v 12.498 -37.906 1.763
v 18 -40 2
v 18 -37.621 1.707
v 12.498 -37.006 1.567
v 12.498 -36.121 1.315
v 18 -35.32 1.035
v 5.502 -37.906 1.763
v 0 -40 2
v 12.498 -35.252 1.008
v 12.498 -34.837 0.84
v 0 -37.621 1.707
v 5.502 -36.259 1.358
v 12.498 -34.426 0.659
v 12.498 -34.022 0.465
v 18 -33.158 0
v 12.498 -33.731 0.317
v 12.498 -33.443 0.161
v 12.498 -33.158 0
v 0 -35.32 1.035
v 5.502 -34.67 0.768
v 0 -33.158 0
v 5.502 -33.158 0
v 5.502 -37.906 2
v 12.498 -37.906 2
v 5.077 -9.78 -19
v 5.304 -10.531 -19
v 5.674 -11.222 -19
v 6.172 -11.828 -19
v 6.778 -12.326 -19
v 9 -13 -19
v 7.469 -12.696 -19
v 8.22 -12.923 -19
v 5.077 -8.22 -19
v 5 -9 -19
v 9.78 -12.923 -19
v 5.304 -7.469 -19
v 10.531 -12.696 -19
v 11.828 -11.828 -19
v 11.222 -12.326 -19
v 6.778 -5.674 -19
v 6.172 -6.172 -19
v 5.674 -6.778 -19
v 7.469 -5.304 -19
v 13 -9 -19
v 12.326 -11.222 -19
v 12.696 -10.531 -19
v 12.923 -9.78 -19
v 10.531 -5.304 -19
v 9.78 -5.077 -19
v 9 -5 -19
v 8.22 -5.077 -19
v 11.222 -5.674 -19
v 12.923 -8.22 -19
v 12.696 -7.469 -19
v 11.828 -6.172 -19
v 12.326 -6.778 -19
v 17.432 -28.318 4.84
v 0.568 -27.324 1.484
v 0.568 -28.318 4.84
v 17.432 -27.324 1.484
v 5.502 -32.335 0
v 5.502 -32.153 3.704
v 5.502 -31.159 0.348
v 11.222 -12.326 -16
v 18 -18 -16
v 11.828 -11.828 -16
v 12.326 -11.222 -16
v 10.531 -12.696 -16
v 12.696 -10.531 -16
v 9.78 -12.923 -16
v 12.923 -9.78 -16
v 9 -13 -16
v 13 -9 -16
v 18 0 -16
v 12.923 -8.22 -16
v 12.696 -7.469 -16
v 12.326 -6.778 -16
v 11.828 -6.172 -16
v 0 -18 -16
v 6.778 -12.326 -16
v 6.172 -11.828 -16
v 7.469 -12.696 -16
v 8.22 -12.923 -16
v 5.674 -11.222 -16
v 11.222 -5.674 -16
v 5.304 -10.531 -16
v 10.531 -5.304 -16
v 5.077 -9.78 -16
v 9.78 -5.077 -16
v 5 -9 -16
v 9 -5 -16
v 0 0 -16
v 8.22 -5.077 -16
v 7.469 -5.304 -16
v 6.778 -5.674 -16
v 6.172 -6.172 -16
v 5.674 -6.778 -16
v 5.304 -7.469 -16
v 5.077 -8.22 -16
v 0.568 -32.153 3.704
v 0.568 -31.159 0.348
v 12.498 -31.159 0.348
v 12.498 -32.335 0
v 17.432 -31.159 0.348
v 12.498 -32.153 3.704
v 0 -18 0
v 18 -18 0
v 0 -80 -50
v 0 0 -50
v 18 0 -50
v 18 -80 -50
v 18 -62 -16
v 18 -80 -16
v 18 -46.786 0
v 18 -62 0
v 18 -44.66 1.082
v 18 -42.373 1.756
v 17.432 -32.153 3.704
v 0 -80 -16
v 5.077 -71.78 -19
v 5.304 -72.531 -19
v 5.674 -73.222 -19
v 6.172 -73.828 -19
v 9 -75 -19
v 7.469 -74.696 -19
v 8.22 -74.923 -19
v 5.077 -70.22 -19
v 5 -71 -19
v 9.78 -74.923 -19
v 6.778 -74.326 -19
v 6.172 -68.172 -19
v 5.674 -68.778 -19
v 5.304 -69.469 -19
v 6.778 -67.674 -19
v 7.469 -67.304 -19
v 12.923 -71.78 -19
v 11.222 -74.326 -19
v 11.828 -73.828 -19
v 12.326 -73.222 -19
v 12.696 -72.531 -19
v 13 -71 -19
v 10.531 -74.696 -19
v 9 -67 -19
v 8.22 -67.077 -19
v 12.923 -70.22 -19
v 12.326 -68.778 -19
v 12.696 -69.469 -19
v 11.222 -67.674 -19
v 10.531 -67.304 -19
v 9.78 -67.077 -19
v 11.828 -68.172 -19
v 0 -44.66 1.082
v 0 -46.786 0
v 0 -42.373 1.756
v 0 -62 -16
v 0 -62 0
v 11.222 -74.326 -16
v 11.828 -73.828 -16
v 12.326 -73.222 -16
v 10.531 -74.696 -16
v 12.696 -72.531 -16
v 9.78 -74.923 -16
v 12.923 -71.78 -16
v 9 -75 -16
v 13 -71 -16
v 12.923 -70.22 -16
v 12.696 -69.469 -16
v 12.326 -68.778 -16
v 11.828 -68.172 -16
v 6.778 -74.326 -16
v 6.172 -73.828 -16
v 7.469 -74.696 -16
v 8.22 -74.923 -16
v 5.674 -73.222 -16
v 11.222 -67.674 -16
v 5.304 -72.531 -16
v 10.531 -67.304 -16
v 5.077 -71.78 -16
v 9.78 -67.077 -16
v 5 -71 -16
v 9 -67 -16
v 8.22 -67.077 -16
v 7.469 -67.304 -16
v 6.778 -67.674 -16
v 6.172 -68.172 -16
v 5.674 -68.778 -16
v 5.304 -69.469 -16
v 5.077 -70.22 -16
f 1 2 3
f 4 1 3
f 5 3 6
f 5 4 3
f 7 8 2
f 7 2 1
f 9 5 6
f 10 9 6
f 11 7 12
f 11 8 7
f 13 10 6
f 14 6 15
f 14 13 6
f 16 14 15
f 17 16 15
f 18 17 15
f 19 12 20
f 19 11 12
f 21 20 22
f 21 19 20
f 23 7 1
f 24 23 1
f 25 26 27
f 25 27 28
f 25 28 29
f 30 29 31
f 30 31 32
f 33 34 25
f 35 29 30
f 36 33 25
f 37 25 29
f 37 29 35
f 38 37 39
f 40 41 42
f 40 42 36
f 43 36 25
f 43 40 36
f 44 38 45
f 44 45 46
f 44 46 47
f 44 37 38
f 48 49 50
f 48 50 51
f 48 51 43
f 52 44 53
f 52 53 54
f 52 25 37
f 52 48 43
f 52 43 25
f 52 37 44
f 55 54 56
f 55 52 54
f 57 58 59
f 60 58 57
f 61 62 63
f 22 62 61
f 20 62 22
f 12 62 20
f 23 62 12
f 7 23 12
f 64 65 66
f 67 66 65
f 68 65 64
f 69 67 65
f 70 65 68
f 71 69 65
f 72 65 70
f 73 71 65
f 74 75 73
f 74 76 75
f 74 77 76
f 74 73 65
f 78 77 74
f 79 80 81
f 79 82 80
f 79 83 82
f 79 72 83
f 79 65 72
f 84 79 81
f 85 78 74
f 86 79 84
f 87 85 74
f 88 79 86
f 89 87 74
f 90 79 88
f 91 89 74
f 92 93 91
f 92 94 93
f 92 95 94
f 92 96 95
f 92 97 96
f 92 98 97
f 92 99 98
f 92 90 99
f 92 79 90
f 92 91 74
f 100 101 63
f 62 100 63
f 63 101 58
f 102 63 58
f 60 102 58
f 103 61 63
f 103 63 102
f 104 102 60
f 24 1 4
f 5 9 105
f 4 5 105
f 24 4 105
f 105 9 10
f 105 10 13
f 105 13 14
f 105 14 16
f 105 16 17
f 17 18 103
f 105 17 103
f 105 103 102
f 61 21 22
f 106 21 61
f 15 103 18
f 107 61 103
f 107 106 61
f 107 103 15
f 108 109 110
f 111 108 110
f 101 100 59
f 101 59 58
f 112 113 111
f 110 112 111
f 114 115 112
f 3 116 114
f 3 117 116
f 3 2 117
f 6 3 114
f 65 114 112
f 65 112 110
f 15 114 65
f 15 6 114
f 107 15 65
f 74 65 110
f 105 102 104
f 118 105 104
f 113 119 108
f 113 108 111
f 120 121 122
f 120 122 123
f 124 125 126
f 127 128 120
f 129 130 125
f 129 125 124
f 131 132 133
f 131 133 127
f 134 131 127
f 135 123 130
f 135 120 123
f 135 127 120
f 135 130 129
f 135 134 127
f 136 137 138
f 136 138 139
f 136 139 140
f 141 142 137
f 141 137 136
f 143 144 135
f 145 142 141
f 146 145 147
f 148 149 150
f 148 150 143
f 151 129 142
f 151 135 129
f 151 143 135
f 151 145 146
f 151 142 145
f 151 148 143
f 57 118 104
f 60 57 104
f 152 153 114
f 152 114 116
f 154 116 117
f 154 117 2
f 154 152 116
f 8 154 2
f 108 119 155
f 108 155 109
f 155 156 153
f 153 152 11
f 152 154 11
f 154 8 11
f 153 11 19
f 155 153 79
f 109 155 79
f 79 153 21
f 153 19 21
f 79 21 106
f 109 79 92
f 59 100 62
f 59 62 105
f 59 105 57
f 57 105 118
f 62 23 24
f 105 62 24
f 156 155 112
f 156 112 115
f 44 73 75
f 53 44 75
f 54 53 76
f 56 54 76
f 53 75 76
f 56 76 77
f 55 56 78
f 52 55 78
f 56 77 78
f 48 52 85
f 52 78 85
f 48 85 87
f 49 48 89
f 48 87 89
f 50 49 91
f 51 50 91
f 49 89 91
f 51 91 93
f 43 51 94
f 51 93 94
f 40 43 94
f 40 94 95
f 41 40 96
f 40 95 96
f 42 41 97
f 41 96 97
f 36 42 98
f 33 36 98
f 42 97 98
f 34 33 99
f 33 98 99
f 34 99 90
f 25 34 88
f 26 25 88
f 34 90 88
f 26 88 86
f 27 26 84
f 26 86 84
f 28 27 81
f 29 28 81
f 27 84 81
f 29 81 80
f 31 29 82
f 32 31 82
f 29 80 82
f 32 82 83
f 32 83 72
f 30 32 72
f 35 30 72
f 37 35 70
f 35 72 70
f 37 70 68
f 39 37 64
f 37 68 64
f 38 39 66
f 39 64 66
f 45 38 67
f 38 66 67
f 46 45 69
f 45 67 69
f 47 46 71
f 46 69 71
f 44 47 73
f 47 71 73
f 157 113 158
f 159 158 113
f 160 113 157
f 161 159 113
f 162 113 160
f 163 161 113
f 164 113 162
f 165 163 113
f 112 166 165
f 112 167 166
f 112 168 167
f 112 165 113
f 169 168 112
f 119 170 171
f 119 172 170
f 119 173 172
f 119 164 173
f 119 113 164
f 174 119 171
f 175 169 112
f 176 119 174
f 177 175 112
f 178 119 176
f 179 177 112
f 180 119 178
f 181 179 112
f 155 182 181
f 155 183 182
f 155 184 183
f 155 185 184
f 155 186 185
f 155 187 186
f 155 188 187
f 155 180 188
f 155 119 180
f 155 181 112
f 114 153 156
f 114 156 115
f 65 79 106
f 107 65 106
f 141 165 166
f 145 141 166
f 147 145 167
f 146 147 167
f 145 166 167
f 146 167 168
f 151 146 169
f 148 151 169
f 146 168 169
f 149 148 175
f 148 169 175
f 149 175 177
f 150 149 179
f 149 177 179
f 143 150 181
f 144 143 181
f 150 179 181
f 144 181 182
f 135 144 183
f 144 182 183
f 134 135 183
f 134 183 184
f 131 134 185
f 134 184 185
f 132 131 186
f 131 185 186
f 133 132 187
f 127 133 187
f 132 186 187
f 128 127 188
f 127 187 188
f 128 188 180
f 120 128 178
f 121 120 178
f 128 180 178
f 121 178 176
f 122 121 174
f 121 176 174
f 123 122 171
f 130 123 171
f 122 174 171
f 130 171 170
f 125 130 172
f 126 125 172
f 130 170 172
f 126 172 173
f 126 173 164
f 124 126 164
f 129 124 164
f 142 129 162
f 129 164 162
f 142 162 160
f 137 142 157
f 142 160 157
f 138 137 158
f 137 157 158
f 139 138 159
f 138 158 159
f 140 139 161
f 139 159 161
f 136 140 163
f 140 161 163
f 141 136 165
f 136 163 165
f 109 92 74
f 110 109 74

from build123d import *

# Parameters (mm, degrees)
CROQUIS1_W              = 18
CROQUIS1_H              = 80
SALIENTE_EXTRUIR1_DEPTH = 50
CROQUIS2_W              = 16
CROQUIS2_H              = 18
CORTAR_EXTRUIR1_DEPTH   = 25
SALIENTE_EXTRUIR2_DEPTH = 18
CROQUIS4_W              = 6.99659876
CROQUIS4_H              = 2.653687506
SALIENTE_EXTRUIR3_DEPTH = 2
CORTAR_EXTRUIR2_DEPTH   = 6.996599
CROQUIS6_W              = 6.99659876
CROQUIS6_H              = 3.5
SALIENTE_EXTRUIR4_DEPTH = 6
CROQUIS7_W              = 16.864509826
CROQUIS7_H              = 3.5
SALIENTE_EXTRUIR5_DEPTH = 4
CROQUIS8_R              = 4
CORTAR_EXTRUIR3_DEPTH   = 3


with BuildPart() as part:
    # Croquis1 → Saliente-Extruir1 (new body)
    with BuildSketch(Plane.XY):
        with Locations((9, -40)):
            Rectangle(CROQUIS1_W, CROQUIS1_H)
    extrude(amount=-SALIENTE_EXTRUIR1_DEPTH)

    # Croquis2 → Cortar-Extruir1 (cut)
    with BuildSketch(Plane.ZY):
        with Locations((-8, -9)):
            Rectangle(CROQUIS2_W, CROQUIS2_H)
        with Locations((-8, -71)):
            Rectangle(CROQUIS2_W, CROQUIS2_H)
    extrude(amount=-CORTAR_EXTRUIR1_DEPTH, mode=Mode.SUBTRACT)

    # Croquis3 → Saliente-Extruir2 (add)
    with BuildSketch(Plane.ZY):
        with BuildLine():
            Line((0, -33.158339238), (0, -46.786065604))
            ThreePointArc((0, -46.786065604), (1.471610076, -43.53202647), (2, -40))
            ThreePointArc((2, -40), (1.417568162, -36.457103303), (0, -33.158339238))
        make_face()
    extrude(amount=-SALIENTE_EXTRUIR2_DEPTH)

    # Croquis4 → Saliente-Extruir3 (add)
    with BuildSketch(Plane.XY):
        with Locations((9, -36.579169619)):
            Rectangle(CROQUIS4_W, CROQUIS4_H)
    extrude(amount=SALIENTE_EXTRUIR3_DEPTH)

    # Croquis5 → Cortar-Extruir2 (cut)
    with BuildSketch(Plane.ZY.offset(-5.50170062)):
        Polygon((2, -37.906013372), (-1.355869072, -36.911959665), (-0.421934466, -33.759049274), (2.933934606, -34.75310298), align=None)
    extrude(amount=-CORTAR_EXTRUIR2_DEPTH, mode=Mode.SUBTRACT)

    # Croquis6 → Saliente-Extruir4 (add)
    with BuildSketch(Plane(origin=(0, -34.303696532, -10.16121784), x_dir=(1, 0, 0), z_dir=(0, 0.958819735, 0.284015345))):
        with Locations((9, -10.933528924)):
            Rectangle(CROQUIS6_W, CROQUIS6_H)
    extrude(amount=SALIENTE_EXTRUIR4_DEPTH)

    # Croquis7 → Saliente-Extruir5 (add)
    with BuildSketch(Plane(origin=(0, -28.550778123, -8.457125772), x_dir=(1, 0, 0), z_dir=(0, 0.958819735, 0.284015345))):
        with Locations((9, -10.933528924)):
            Rectangle(CROQUIS7_W, CROQUIS7_H)
    extrude(amount=SALIENTE_EXTRUIR5_DEPTH)

    # Croquis8 → Cortar-Extruir3 (cut)
    with BuildSketch(Plane.XY.offset(-16)):
        with Locations((9, -9)):
            Circle(CROQUIS8_R)
        with Locations((9, -71)):
            Circle(CROQUIS8_R)
    extrude(amount=-CORTAR_EXTRUIR3_DEPTH, mode=Mode.SUBTRACT)


solid = part.part
